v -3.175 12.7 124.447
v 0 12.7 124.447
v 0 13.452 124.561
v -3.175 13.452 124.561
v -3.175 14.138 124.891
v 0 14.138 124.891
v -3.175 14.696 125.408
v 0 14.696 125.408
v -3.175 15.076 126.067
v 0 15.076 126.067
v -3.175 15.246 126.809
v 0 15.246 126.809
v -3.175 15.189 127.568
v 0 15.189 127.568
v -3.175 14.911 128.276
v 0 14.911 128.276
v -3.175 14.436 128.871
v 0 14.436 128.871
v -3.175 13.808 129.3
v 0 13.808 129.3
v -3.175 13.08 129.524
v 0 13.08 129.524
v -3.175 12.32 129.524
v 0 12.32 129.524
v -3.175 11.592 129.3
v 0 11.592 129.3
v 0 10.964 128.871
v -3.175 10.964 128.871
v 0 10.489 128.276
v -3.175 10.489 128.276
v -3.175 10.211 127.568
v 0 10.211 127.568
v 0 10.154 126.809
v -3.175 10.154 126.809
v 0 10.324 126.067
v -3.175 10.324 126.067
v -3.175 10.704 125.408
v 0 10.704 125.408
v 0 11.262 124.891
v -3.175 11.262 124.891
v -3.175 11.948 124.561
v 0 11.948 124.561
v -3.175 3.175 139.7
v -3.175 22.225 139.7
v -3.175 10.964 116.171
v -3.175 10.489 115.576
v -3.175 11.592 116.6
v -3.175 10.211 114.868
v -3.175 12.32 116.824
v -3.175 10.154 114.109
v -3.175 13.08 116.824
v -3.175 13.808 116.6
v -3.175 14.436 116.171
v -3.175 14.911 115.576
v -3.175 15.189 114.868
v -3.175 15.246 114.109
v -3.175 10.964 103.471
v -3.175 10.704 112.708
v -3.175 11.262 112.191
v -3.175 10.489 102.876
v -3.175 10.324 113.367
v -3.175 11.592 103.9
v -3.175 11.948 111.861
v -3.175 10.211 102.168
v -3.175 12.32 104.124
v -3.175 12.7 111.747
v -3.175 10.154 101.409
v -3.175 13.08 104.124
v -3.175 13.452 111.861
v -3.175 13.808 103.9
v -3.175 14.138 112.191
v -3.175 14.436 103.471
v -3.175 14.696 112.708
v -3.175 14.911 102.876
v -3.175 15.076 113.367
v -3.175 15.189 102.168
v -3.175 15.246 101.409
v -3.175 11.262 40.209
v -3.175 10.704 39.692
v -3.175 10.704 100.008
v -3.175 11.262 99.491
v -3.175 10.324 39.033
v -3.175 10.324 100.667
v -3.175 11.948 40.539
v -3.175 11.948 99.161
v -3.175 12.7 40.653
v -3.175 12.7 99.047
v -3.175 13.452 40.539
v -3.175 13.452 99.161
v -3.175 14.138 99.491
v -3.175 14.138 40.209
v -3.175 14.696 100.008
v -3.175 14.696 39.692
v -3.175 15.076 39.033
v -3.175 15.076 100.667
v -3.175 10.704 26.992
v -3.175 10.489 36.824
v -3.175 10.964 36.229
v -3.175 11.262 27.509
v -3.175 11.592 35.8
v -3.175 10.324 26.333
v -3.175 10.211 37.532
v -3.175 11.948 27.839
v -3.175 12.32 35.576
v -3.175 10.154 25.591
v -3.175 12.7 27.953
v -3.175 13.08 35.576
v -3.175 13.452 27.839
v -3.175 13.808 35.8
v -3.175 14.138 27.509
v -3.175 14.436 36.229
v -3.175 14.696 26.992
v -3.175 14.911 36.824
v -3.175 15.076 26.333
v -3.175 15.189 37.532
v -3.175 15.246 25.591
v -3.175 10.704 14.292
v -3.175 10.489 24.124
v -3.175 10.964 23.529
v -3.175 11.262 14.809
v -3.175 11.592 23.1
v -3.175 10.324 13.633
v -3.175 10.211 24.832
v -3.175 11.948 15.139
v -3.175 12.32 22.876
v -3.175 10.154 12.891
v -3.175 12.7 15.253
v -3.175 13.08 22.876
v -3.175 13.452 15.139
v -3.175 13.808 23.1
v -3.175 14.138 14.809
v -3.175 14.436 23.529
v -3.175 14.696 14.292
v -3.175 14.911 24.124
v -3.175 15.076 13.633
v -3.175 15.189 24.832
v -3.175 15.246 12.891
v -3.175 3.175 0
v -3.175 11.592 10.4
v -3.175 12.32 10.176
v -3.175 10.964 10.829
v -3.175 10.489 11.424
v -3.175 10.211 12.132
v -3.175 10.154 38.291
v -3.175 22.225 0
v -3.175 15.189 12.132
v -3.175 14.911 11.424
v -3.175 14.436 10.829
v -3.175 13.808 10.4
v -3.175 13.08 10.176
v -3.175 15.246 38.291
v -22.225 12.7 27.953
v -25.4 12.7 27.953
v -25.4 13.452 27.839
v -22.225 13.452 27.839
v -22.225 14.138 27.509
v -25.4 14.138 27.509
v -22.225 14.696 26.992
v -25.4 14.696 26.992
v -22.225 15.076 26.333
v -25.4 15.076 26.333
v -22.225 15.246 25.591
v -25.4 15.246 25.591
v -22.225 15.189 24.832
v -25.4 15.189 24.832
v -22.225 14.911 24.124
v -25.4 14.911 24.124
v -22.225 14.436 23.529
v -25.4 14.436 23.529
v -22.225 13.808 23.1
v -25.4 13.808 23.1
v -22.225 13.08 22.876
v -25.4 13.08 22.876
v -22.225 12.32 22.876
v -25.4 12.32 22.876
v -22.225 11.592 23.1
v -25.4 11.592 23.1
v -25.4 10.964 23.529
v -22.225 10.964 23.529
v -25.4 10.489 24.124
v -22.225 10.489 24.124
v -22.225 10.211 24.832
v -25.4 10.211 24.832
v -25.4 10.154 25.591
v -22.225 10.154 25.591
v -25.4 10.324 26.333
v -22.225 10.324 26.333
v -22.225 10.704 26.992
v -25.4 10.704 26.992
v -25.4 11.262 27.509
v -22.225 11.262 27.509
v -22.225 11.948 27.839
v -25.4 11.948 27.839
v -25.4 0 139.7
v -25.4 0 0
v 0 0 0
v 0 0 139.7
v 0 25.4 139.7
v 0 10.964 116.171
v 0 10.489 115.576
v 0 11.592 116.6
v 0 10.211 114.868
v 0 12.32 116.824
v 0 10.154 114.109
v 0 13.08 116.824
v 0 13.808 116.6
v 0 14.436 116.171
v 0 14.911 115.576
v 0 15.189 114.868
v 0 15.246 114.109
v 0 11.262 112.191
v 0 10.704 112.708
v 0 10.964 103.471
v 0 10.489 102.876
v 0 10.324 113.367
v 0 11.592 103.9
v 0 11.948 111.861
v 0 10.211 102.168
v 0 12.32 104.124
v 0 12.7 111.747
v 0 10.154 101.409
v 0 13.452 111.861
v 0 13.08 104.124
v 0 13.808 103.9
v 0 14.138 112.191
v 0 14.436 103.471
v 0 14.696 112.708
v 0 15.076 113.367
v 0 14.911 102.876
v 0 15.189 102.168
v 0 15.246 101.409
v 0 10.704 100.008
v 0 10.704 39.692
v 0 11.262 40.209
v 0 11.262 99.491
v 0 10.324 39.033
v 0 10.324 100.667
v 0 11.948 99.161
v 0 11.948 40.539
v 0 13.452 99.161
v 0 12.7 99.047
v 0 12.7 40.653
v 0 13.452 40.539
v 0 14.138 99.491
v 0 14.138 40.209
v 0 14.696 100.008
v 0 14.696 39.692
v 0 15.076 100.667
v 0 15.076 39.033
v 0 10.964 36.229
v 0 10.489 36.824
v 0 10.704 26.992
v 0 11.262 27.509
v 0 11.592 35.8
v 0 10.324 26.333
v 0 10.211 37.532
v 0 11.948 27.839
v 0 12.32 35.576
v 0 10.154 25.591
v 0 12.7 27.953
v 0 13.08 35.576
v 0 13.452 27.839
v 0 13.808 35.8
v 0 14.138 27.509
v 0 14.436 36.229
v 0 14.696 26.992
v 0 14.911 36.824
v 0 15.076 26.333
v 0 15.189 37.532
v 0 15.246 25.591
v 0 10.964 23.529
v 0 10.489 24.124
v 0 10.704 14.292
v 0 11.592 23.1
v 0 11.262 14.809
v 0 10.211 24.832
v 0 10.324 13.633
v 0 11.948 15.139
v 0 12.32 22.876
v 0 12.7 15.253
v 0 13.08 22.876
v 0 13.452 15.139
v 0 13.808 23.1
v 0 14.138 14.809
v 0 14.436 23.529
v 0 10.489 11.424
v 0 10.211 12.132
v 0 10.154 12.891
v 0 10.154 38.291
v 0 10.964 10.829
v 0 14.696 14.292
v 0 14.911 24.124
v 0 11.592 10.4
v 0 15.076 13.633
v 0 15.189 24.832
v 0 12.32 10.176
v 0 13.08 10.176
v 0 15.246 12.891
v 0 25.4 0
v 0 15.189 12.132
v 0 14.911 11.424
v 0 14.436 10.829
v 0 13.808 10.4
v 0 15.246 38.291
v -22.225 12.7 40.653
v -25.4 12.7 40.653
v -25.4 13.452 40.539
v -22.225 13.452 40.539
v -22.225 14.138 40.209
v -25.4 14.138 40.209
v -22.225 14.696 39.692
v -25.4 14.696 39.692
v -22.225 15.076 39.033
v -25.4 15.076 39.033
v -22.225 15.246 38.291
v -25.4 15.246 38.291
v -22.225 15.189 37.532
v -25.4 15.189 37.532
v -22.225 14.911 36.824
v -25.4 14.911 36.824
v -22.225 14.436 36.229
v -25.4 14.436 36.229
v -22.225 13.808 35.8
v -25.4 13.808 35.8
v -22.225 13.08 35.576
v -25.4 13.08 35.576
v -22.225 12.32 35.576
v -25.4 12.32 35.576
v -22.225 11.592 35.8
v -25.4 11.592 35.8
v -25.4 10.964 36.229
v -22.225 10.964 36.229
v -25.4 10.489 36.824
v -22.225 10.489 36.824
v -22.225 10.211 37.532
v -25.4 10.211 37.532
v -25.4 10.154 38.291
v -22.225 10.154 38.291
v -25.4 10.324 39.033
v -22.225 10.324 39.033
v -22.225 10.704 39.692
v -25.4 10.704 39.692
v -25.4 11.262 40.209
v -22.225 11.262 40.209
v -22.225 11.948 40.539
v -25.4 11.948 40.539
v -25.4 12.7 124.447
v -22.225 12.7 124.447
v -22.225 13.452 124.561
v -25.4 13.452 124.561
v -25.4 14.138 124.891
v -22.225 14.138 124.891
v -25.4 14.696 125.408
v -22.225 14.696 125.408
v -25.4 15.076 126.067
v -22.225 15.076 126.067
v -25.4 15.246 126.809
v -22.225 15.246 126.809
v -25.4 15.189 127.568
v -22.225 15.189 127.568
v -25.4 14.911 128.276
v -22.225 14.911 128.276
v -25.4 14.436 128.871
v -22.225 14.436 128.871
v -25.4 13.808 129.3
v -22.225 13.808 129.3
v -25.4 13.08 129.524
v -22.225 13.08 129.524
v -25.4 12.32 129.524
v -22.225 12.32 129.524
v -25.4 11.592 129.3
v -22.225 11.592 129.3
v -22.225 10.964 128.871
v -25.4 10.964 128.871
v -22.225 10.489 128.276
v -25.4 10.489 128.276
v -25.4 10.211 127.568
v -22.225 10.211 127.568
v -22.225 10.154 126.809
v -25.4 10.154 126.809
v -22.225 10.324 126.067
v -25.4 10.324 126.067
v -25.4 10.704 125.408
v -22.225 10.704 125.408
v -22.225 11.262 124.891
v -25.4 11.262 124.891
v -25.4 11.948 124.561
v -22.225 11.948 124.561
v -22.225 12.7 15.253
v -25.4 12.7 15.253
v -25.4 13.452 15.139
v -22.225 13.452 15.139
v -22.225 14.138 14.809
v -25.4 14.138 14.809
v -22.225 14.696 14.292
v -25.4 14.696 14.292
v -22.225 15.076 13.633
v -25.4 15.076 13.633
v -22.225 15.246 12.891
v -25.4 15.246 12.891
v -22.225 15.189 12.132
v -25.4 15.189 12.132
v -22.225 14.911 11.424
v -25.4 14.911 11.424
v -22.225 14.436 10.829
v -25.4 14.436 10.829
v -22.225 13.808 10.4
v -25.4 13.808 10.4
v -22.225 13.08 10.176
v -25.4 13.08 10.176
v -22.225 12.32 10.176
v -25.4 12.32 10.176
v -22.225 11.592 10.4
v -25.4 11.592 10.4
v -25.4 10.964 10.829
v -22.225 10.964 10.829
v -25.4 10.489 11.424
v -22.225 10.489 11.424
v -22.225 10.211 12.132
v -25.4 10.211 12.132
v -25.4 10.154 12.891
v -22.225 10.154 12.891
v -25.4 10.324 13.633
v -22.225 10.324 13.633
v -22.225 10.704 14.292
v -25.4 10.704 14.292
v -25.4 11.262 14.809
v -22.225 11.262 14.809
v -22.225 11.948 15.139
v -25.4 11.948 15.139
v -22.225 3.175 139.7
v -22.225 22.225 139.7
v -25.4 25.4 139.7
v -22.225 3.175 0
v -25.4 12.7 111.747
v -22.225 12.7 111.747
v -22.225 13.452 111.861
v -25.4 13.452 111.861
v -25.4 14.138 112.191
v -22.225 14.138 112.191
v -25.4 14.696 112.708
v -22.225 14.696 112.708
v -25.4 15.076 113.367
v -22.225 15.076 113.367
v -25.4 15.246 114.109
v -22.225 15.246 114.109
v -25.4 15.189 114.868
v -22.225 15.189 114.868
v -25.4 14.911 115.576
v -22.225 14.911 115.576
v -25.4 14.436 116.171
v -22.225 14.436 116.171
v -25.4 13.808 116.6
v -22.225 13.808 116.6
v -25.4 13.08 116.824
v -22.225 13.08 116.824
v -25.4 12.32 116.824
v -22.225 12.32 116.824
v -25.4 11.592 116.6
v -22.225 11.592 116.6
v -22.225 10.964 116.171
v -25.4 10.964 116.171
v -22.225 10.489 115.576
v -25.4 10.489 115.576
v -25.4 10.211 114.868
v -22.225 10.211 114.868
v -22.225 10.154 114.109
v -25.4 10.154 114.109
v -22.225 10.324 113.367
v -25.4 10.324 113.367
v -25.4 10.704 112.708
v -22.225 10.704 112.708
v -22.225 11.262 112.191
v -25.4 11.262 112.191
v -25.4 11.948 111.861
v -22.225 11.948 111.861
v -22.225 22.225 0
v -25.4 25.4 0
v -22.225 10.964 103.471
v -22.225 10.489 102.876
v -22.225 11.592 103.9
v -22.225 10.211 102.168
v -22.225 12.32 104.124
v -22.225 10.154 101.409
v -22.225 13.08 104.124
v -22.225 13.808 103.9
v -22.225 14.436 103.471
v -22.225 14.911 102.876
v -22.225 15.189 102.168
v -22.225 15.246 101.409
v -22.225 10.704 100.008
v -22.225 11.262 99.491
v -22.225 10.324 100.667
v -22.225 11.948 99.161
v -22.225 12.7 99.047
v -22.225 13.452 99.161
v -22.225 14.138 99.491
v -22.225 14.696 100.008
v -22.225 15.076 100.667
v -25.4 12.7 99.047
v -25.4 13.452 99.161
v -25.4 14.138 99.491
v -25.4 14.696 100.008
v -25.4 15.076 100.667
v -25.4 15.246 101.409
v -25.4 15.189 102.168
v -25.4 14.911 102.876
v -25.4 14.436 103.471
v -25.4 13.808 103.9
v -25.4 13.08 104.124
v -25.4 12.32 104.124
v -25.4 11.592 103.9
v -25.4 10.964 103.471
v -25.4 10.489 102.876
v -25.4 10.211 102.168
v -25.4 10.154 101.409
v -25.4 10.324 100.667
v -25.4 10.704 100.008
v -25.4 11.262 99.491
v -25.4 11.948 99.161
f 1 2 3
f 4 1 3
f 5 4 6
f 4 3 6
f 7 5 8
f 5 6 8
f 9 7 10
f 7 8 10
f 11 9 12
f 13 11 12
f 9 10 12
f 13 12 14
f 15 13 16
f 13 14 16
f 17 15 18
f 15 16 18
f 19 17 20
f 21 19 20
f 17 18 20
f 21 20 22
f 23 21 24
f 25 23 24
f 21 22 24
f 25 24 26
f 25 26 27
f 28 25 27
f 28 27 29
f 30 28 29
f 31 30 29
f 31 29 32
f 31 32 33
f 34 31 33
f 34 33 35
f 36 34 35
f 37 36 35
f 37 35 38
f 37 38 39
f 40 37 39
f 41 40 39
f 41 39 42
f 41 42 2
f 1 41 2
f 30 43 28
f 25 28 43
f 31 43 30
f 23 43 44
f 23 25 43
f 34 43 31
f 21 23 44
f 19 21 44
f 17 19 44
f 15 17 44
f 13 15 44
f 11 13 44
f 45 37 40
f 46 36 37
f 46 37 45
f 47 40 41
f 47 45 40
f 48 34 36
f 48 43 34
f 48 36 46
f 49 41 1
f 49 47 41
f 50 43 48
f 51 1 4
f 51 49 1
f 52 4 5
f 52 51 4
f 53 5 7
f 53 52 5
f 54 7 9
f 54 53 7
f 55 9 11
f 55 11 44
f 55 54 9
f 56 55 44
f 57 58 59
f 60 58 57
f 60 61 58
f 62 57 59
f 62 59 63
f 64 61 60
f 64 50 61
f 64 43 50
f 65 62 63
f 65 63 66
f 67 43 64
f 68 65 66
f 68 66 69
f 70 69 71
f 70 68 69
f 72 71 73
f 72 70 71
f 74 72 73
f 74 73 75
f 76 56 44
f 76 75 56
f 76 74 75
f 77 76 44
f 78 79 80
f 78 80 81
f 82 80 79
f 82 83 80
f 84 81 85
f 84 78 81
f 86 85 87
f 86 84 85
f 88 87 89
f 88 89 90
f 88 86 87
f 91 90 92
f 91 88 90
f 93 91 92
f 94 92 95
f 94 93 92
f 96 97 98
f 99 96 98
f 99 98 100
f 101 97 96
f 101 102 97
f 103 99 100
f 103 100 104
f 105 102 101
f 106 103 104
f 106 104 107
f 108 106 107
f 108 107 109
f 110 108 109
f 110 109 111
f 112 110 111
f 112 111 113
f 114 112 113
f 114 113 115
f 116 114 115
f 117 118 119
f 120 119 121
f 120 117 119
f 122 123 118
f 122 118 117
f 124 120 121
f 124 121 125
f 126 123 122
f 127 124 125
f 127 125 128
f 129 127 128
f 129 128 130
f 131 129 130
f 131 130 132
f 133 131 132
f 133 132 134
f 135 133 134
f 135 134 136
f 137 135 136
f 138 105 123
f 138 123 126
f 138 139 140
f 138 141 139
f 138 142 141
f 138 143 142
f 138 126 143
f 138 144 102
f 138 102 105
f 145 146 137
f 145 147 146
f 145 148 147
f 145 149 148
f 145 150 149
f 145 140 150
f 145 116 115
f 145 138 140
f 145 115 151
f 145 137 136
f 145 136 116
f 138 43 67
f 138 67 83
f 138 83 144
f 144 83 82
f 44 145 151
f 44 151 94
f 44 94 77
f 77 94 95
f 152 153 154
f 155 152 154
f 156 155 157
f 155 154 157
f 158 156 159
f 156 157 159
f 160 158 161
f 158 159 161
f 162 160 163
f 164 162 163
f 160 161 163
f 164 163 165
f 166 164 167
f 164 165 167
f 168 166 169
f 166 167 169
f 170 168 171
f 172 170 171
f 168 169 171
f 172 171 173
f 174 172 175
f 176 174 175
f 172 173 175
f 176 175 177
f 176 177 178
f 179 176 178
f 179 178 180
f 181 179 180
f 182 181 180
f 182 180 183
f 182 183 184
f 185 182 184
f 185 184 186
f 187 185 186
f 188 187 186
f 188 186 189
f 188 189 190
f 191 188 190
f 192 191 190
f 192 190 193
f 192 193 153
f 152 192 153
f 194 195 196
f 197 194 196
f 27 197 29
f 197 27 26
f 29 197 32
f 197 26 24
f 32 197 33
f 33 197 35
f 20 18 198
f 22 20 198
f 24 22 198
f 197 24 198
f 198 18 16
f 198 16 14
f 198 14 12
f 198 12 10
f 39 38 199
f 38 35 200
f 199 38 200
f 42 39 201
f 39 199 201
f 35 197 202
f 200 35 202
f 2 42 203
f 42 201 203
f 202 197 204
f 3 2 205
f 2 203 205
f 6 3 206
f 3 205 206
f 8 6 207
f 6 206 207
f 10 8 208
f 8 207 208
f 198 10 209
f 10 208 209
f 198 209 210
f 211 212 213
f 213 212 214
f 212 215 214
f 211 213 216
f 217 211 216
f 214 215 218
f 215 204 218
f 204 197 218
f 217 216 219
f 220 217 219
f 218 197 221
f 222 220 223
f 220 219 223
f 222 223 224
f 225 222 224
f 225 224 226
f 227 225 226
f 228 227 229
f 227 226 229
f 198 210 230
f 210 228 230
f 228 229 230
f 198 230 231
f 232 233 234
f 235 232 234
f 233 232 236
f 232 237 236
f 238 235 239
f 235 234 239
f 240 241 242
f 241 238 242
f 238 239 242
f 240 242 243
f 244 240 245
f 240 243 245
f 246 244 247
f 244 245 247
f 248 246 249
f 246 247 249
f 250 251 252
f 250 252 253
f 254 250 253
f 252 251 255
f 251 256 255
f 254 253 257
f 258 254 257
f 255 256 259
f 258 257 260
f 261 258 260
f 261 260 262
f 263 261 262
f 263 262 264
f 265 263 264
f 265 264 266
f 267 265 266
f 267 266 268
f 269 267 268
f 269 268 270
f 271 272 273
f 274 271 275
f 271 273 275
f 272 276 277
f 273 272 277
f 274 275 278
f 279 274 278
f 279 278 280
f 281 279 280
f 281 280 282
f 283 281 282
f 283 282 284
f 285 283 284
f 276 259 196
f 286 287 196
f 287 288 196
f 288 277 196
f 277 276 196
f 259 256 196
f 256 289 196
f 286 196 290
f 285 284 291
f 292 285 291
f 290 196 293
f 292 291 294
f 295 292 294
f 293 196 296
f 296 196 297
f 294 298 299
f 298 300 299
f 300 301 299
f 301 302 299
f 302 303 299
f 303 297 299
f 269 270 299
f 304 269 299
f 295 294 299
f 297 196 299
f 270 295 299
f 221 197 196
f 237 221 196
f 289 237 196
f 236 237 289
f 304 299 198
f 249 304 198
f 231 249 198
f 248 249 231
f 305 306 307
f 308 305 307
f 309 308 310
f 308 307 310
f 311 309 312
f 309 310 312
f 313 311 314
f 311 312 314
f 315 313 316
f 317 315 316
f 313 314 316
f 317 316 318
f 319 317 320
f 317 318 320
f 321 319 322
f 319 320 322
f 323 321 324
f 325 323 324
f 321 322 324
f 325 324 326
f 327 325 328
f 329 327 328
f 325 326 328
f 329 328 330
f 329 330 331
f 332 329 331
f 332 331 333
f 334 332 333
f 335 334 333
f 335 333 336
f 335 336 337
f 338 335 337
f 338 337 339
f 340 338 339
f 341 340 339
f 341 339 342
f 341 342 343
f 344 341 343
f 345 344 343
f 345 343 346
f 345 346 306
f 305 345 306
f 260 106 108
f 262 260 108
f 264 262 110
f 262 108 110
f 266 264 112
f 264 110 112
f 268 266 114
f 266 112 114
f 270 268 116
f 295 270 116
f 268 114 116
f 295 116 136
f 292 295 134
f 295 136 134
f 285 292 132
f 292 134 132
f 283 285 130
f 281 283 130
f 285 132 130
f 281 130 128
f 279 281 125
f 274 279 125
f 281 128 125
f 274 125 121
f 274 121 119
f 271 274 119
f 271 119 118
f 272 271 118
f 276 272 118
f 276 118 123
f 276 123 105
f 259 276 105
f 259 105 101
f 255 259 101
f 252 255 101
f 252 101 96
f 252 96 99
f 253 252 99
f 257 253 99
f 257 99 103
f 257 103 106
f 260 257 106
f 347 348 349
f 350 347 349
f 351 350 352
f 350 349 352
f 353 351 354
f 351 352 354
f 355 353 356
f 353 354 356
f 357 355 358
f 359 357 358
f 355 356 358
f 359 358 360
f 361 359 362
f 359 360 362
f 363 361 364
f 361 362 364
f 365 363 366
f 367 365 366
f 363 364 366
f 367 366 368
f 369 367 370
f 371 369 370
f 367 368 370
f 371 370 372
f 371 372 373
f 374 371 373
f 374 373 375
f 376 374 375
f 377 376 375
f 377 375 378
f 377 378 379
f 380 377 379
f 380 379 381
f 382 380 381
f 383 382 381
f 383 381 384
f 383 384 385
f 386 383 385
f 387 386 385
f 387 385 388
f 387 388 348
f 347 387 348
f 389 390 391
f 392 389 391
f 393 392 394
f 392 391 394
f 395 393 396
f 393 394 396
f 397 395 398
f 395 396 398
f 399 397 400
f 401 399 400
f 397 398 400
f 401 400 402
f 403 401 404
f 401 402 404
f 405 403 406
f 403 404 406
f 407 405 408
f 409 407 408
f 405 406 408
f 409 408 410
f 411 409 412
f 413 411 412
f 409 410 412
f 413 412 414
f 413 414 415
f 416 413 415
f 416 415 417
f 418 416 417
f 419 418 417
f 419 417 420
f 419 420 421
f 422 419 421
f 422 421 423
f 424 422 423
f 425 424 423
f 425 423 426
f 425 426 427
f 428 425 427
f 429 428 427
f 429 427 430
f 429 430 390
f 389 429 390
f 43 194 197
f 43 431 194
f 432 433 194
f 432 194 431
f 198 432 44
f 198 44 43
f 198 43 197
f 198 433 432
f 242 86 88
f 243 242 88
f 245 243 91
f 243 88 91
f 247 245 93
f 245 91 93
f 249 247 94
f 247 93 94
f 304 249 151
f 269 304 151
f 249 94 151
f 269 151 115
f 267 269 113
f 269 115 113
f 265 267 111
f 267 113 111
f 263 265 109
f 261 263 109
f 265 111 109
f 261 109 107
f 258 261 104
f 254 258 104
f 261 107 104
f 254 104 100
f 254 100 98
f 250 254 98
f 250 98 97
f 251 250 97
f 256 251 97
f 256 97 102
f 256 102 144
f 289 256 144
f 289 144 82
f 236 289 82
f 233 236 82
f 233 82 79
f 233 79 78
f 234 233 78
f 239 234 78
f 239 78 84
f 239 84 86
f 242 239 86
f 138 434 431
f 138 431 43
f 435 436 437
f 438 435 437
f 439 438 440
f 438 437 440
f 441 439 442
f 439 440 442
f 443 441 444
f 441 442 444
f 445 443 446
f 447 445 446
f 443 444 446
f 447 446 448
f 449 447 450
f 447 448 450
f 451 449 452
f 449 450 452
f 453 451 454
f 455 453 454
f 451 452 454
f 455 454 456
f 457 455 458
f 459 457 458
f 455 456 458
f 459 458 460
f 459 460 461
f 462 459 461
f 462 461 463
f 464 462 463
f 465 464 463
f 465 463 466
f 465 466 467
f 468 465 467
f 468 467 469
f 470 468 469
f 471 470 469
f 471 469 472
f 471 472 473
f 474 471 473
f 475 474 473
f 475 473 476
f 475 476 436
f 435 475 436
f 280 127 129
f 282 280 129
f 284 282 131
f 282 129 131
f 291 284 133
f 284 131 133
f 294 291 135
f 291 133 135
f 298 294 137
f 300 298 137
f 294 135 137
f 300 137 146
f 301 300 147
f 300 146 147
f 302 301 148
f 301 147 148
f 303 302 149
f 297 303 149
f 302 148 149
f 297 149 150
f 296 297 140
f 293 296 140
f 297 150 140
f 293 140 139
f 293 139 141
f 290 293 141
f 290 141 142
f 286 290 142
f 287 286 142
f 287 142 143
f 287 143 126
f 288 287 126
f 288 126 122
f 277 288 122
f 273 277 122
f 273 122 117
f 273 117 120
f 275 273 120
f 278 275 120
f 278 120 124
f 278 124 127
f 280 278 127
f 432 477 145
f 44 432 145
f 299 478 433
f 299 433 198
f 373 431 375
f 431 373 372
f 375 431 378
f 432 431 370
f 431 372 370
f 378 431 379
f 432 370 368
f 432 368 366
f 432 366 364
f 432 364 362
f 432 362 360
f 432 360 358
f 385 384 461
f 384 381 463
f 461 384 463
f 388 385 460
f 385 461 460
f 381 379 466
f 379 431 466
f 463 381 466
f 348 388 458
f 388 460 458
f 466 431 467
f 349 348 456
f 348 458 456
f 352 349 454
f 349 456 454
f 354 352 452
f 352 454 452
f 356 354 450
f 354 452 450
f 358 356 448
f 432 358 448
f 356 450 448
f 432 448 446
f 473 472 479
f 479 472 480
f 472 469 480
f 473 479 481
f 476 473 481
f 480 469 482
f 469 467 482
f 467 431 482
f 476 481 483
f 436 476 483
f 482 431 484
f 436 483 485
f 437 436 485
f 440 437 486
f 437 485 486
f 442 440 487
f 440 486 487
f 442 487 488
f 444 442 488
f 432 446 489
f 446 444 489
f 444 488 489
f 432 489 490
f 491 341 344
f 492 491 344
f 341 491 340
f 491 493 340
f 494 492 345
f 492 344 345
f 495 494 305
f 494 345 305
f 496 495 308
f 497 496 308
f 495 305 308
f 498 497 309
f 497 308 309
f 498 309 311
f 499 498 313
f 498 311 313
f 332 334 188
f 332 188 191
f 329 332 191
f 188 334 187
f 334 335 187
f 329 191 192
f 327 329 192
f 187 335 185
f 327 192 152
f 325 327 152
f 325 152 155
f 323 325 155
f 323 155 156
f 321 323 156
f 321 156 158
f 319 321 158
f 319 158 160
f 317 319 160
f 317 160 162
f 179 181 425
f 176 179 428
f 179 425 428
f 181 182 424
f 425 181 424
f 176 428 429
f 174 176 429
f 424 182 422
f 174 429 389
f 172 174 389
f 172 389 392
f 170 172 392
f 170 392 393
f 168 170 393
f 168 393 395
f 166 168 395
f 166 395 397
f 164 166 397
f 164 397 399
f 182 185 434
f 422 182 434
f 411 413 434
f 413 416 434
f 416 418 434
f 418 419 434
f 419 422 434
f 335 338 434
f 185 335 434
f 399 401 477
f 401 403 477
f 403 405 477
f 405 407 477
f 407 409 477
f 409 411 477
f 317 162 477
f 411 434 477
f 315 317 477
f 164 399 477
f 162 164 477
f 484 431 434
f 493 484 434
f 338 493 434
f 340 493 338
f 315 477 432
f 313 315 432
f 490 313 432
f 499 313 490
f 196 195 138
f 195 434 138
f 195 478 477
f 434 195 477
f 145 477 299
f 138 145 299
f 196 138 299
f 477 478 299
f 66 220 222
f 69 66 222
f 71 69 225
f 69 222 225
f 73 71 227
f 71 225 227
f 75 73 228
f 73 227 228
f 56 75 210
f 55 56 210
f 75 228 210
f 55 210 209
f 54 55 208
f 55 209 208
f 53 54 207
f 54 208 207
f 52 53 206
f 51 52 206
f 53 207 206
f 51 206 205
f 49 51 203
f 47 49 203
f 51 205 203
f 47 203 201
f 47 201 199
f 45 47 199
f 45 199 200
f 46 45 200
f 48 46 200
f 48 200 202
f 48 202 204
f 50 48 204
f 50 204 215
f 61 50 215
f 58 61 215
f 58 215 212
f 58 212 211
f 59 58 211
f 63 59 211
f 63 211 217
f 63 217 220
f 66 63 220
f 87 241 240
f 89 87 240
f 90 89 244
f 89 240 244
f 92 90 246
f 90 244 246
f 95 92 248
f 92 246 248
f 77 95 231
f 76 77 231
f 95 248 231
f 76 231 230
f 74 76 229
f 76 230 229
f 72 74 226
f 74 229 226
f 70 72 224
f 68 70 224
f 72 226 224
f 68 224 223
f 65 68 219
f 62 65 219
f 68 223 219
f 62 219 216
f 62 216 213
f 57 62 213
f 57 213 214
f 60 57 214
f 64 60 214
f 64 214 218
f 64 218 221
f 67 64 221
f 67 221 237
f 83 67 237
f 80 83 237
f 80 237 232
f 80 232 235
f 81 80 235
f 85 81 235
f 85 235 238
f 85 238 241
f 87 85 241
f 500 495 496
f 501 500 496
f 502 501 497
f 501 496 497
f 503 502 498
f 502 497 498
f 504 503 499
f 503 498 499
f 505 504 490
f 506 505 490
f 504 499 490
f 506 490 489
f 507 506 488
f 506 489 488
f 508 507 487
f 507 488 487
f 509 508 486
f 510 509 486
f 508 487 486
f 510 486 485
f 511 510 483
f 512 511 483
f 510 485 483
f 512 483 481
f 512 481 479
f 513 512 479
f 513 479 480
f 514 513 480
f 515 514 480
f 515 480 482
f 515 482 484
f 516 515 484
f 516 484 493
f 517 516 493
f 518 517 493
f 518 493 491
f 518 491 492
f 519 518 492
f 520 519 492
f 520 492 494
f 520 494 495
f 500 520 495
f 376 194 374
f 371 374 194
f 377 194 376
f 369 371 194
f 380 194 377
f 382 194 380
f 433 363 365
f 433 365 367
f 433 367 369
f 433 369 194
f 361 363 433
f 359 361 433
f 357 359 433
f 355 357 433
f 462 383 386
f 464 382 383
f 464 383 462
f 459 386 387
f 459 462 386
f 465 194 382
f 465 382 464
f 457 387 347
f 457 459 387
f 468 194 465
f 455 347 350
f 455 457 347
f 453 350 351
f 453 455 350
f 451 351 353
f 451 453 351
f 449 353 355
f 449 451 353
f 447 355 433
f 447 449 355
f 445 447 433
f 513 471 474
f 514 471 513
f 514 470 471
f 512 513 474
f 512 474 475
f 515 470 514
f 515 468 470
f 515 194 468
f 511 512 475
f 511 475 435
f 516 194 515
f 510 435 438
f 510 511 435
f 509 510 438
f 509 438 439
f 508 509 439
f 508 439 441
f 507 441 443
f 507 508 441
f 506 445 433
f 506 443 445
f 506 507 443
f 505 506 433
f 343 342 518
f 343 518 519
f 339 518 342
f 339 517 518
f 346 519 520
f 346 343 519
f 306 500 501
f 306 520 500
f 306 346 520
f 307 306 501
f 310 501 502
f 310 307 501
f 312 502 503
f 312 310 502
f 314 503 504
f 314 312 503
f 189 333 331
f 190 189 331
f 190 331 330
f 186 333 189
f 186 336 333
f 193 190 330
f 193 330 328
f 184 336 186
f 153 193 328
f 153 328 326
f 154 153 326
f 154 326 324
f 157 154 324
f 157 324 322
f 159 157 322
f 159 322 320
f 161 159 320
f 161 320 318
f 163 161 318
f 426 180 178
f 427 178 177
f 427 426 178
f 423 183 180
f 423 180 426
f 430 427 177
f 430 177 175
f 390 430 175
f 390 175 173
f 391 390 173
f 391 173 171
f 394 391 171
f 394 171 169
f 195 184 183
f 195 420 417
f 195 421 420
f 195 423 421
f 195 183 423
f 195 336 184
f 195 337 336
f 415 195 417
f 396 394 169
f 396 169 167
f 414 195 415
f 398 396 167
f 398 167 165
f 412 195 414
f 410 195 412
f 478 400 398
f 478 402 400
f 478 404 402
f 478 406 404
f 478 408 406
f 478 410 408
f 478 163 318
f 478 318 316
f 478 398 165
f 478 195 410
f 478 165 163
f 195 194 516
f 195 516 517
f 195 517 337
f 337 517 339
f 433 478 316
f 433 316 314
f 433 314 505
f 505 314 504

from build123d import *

# Parameters (mm, degrees)
SKETCH1_W              = 25.4
SKETCH1_H              = 25.4
SKETCH1_W_2            = 19.05
SKETCH1_H_2            = 19.05
EXTRUDE_THIN1_DEPTH    = 139.7
F_10_CLEARANCE_HOLE1_D = 5.1054
F_10_CLEARANCE_HOLE2_D = 5.1054


with BuildPart() as part:
    # Sketch1 → Extrude-Thin1 (new body)
    with BuildSketch(Plane.XY):
        with Locations((-12.7, 12.7)):
            Rectangle(SKETCH1_W, SKETCH1_H)
        with Locations((-12.7, 12.7)):
            Rectangle(SKETCH1_W_2, SKETCH1_H_2, mode=Mode.SUBTRACT)
    extrude(amount=EXTRUDE_THIN1_DEPTH)

    # #10 Clearance Hole1 (through all)
    with Locations(Plane(origin=(0, 0, 0), x_dir=(0, 0, -1), z_dir=(1, 0, 0))):
        with Locations((-12.7, 12.7), (-25.4, 12.7), (-38.1, 12.7)):
            Hole(F_10_CLEARANCE_HOLE1_D / 2)

    # #10 Clearance Hole2 (through all)
    with Locations(Plane.ZY.offset(25.4)):
        with Locations((114.3, 12.7), (127, 12.7), (101.6, 12.7)):
            Hole(F_10_CLEARANCE_HOLE2_D / 2)


solid = part.part
